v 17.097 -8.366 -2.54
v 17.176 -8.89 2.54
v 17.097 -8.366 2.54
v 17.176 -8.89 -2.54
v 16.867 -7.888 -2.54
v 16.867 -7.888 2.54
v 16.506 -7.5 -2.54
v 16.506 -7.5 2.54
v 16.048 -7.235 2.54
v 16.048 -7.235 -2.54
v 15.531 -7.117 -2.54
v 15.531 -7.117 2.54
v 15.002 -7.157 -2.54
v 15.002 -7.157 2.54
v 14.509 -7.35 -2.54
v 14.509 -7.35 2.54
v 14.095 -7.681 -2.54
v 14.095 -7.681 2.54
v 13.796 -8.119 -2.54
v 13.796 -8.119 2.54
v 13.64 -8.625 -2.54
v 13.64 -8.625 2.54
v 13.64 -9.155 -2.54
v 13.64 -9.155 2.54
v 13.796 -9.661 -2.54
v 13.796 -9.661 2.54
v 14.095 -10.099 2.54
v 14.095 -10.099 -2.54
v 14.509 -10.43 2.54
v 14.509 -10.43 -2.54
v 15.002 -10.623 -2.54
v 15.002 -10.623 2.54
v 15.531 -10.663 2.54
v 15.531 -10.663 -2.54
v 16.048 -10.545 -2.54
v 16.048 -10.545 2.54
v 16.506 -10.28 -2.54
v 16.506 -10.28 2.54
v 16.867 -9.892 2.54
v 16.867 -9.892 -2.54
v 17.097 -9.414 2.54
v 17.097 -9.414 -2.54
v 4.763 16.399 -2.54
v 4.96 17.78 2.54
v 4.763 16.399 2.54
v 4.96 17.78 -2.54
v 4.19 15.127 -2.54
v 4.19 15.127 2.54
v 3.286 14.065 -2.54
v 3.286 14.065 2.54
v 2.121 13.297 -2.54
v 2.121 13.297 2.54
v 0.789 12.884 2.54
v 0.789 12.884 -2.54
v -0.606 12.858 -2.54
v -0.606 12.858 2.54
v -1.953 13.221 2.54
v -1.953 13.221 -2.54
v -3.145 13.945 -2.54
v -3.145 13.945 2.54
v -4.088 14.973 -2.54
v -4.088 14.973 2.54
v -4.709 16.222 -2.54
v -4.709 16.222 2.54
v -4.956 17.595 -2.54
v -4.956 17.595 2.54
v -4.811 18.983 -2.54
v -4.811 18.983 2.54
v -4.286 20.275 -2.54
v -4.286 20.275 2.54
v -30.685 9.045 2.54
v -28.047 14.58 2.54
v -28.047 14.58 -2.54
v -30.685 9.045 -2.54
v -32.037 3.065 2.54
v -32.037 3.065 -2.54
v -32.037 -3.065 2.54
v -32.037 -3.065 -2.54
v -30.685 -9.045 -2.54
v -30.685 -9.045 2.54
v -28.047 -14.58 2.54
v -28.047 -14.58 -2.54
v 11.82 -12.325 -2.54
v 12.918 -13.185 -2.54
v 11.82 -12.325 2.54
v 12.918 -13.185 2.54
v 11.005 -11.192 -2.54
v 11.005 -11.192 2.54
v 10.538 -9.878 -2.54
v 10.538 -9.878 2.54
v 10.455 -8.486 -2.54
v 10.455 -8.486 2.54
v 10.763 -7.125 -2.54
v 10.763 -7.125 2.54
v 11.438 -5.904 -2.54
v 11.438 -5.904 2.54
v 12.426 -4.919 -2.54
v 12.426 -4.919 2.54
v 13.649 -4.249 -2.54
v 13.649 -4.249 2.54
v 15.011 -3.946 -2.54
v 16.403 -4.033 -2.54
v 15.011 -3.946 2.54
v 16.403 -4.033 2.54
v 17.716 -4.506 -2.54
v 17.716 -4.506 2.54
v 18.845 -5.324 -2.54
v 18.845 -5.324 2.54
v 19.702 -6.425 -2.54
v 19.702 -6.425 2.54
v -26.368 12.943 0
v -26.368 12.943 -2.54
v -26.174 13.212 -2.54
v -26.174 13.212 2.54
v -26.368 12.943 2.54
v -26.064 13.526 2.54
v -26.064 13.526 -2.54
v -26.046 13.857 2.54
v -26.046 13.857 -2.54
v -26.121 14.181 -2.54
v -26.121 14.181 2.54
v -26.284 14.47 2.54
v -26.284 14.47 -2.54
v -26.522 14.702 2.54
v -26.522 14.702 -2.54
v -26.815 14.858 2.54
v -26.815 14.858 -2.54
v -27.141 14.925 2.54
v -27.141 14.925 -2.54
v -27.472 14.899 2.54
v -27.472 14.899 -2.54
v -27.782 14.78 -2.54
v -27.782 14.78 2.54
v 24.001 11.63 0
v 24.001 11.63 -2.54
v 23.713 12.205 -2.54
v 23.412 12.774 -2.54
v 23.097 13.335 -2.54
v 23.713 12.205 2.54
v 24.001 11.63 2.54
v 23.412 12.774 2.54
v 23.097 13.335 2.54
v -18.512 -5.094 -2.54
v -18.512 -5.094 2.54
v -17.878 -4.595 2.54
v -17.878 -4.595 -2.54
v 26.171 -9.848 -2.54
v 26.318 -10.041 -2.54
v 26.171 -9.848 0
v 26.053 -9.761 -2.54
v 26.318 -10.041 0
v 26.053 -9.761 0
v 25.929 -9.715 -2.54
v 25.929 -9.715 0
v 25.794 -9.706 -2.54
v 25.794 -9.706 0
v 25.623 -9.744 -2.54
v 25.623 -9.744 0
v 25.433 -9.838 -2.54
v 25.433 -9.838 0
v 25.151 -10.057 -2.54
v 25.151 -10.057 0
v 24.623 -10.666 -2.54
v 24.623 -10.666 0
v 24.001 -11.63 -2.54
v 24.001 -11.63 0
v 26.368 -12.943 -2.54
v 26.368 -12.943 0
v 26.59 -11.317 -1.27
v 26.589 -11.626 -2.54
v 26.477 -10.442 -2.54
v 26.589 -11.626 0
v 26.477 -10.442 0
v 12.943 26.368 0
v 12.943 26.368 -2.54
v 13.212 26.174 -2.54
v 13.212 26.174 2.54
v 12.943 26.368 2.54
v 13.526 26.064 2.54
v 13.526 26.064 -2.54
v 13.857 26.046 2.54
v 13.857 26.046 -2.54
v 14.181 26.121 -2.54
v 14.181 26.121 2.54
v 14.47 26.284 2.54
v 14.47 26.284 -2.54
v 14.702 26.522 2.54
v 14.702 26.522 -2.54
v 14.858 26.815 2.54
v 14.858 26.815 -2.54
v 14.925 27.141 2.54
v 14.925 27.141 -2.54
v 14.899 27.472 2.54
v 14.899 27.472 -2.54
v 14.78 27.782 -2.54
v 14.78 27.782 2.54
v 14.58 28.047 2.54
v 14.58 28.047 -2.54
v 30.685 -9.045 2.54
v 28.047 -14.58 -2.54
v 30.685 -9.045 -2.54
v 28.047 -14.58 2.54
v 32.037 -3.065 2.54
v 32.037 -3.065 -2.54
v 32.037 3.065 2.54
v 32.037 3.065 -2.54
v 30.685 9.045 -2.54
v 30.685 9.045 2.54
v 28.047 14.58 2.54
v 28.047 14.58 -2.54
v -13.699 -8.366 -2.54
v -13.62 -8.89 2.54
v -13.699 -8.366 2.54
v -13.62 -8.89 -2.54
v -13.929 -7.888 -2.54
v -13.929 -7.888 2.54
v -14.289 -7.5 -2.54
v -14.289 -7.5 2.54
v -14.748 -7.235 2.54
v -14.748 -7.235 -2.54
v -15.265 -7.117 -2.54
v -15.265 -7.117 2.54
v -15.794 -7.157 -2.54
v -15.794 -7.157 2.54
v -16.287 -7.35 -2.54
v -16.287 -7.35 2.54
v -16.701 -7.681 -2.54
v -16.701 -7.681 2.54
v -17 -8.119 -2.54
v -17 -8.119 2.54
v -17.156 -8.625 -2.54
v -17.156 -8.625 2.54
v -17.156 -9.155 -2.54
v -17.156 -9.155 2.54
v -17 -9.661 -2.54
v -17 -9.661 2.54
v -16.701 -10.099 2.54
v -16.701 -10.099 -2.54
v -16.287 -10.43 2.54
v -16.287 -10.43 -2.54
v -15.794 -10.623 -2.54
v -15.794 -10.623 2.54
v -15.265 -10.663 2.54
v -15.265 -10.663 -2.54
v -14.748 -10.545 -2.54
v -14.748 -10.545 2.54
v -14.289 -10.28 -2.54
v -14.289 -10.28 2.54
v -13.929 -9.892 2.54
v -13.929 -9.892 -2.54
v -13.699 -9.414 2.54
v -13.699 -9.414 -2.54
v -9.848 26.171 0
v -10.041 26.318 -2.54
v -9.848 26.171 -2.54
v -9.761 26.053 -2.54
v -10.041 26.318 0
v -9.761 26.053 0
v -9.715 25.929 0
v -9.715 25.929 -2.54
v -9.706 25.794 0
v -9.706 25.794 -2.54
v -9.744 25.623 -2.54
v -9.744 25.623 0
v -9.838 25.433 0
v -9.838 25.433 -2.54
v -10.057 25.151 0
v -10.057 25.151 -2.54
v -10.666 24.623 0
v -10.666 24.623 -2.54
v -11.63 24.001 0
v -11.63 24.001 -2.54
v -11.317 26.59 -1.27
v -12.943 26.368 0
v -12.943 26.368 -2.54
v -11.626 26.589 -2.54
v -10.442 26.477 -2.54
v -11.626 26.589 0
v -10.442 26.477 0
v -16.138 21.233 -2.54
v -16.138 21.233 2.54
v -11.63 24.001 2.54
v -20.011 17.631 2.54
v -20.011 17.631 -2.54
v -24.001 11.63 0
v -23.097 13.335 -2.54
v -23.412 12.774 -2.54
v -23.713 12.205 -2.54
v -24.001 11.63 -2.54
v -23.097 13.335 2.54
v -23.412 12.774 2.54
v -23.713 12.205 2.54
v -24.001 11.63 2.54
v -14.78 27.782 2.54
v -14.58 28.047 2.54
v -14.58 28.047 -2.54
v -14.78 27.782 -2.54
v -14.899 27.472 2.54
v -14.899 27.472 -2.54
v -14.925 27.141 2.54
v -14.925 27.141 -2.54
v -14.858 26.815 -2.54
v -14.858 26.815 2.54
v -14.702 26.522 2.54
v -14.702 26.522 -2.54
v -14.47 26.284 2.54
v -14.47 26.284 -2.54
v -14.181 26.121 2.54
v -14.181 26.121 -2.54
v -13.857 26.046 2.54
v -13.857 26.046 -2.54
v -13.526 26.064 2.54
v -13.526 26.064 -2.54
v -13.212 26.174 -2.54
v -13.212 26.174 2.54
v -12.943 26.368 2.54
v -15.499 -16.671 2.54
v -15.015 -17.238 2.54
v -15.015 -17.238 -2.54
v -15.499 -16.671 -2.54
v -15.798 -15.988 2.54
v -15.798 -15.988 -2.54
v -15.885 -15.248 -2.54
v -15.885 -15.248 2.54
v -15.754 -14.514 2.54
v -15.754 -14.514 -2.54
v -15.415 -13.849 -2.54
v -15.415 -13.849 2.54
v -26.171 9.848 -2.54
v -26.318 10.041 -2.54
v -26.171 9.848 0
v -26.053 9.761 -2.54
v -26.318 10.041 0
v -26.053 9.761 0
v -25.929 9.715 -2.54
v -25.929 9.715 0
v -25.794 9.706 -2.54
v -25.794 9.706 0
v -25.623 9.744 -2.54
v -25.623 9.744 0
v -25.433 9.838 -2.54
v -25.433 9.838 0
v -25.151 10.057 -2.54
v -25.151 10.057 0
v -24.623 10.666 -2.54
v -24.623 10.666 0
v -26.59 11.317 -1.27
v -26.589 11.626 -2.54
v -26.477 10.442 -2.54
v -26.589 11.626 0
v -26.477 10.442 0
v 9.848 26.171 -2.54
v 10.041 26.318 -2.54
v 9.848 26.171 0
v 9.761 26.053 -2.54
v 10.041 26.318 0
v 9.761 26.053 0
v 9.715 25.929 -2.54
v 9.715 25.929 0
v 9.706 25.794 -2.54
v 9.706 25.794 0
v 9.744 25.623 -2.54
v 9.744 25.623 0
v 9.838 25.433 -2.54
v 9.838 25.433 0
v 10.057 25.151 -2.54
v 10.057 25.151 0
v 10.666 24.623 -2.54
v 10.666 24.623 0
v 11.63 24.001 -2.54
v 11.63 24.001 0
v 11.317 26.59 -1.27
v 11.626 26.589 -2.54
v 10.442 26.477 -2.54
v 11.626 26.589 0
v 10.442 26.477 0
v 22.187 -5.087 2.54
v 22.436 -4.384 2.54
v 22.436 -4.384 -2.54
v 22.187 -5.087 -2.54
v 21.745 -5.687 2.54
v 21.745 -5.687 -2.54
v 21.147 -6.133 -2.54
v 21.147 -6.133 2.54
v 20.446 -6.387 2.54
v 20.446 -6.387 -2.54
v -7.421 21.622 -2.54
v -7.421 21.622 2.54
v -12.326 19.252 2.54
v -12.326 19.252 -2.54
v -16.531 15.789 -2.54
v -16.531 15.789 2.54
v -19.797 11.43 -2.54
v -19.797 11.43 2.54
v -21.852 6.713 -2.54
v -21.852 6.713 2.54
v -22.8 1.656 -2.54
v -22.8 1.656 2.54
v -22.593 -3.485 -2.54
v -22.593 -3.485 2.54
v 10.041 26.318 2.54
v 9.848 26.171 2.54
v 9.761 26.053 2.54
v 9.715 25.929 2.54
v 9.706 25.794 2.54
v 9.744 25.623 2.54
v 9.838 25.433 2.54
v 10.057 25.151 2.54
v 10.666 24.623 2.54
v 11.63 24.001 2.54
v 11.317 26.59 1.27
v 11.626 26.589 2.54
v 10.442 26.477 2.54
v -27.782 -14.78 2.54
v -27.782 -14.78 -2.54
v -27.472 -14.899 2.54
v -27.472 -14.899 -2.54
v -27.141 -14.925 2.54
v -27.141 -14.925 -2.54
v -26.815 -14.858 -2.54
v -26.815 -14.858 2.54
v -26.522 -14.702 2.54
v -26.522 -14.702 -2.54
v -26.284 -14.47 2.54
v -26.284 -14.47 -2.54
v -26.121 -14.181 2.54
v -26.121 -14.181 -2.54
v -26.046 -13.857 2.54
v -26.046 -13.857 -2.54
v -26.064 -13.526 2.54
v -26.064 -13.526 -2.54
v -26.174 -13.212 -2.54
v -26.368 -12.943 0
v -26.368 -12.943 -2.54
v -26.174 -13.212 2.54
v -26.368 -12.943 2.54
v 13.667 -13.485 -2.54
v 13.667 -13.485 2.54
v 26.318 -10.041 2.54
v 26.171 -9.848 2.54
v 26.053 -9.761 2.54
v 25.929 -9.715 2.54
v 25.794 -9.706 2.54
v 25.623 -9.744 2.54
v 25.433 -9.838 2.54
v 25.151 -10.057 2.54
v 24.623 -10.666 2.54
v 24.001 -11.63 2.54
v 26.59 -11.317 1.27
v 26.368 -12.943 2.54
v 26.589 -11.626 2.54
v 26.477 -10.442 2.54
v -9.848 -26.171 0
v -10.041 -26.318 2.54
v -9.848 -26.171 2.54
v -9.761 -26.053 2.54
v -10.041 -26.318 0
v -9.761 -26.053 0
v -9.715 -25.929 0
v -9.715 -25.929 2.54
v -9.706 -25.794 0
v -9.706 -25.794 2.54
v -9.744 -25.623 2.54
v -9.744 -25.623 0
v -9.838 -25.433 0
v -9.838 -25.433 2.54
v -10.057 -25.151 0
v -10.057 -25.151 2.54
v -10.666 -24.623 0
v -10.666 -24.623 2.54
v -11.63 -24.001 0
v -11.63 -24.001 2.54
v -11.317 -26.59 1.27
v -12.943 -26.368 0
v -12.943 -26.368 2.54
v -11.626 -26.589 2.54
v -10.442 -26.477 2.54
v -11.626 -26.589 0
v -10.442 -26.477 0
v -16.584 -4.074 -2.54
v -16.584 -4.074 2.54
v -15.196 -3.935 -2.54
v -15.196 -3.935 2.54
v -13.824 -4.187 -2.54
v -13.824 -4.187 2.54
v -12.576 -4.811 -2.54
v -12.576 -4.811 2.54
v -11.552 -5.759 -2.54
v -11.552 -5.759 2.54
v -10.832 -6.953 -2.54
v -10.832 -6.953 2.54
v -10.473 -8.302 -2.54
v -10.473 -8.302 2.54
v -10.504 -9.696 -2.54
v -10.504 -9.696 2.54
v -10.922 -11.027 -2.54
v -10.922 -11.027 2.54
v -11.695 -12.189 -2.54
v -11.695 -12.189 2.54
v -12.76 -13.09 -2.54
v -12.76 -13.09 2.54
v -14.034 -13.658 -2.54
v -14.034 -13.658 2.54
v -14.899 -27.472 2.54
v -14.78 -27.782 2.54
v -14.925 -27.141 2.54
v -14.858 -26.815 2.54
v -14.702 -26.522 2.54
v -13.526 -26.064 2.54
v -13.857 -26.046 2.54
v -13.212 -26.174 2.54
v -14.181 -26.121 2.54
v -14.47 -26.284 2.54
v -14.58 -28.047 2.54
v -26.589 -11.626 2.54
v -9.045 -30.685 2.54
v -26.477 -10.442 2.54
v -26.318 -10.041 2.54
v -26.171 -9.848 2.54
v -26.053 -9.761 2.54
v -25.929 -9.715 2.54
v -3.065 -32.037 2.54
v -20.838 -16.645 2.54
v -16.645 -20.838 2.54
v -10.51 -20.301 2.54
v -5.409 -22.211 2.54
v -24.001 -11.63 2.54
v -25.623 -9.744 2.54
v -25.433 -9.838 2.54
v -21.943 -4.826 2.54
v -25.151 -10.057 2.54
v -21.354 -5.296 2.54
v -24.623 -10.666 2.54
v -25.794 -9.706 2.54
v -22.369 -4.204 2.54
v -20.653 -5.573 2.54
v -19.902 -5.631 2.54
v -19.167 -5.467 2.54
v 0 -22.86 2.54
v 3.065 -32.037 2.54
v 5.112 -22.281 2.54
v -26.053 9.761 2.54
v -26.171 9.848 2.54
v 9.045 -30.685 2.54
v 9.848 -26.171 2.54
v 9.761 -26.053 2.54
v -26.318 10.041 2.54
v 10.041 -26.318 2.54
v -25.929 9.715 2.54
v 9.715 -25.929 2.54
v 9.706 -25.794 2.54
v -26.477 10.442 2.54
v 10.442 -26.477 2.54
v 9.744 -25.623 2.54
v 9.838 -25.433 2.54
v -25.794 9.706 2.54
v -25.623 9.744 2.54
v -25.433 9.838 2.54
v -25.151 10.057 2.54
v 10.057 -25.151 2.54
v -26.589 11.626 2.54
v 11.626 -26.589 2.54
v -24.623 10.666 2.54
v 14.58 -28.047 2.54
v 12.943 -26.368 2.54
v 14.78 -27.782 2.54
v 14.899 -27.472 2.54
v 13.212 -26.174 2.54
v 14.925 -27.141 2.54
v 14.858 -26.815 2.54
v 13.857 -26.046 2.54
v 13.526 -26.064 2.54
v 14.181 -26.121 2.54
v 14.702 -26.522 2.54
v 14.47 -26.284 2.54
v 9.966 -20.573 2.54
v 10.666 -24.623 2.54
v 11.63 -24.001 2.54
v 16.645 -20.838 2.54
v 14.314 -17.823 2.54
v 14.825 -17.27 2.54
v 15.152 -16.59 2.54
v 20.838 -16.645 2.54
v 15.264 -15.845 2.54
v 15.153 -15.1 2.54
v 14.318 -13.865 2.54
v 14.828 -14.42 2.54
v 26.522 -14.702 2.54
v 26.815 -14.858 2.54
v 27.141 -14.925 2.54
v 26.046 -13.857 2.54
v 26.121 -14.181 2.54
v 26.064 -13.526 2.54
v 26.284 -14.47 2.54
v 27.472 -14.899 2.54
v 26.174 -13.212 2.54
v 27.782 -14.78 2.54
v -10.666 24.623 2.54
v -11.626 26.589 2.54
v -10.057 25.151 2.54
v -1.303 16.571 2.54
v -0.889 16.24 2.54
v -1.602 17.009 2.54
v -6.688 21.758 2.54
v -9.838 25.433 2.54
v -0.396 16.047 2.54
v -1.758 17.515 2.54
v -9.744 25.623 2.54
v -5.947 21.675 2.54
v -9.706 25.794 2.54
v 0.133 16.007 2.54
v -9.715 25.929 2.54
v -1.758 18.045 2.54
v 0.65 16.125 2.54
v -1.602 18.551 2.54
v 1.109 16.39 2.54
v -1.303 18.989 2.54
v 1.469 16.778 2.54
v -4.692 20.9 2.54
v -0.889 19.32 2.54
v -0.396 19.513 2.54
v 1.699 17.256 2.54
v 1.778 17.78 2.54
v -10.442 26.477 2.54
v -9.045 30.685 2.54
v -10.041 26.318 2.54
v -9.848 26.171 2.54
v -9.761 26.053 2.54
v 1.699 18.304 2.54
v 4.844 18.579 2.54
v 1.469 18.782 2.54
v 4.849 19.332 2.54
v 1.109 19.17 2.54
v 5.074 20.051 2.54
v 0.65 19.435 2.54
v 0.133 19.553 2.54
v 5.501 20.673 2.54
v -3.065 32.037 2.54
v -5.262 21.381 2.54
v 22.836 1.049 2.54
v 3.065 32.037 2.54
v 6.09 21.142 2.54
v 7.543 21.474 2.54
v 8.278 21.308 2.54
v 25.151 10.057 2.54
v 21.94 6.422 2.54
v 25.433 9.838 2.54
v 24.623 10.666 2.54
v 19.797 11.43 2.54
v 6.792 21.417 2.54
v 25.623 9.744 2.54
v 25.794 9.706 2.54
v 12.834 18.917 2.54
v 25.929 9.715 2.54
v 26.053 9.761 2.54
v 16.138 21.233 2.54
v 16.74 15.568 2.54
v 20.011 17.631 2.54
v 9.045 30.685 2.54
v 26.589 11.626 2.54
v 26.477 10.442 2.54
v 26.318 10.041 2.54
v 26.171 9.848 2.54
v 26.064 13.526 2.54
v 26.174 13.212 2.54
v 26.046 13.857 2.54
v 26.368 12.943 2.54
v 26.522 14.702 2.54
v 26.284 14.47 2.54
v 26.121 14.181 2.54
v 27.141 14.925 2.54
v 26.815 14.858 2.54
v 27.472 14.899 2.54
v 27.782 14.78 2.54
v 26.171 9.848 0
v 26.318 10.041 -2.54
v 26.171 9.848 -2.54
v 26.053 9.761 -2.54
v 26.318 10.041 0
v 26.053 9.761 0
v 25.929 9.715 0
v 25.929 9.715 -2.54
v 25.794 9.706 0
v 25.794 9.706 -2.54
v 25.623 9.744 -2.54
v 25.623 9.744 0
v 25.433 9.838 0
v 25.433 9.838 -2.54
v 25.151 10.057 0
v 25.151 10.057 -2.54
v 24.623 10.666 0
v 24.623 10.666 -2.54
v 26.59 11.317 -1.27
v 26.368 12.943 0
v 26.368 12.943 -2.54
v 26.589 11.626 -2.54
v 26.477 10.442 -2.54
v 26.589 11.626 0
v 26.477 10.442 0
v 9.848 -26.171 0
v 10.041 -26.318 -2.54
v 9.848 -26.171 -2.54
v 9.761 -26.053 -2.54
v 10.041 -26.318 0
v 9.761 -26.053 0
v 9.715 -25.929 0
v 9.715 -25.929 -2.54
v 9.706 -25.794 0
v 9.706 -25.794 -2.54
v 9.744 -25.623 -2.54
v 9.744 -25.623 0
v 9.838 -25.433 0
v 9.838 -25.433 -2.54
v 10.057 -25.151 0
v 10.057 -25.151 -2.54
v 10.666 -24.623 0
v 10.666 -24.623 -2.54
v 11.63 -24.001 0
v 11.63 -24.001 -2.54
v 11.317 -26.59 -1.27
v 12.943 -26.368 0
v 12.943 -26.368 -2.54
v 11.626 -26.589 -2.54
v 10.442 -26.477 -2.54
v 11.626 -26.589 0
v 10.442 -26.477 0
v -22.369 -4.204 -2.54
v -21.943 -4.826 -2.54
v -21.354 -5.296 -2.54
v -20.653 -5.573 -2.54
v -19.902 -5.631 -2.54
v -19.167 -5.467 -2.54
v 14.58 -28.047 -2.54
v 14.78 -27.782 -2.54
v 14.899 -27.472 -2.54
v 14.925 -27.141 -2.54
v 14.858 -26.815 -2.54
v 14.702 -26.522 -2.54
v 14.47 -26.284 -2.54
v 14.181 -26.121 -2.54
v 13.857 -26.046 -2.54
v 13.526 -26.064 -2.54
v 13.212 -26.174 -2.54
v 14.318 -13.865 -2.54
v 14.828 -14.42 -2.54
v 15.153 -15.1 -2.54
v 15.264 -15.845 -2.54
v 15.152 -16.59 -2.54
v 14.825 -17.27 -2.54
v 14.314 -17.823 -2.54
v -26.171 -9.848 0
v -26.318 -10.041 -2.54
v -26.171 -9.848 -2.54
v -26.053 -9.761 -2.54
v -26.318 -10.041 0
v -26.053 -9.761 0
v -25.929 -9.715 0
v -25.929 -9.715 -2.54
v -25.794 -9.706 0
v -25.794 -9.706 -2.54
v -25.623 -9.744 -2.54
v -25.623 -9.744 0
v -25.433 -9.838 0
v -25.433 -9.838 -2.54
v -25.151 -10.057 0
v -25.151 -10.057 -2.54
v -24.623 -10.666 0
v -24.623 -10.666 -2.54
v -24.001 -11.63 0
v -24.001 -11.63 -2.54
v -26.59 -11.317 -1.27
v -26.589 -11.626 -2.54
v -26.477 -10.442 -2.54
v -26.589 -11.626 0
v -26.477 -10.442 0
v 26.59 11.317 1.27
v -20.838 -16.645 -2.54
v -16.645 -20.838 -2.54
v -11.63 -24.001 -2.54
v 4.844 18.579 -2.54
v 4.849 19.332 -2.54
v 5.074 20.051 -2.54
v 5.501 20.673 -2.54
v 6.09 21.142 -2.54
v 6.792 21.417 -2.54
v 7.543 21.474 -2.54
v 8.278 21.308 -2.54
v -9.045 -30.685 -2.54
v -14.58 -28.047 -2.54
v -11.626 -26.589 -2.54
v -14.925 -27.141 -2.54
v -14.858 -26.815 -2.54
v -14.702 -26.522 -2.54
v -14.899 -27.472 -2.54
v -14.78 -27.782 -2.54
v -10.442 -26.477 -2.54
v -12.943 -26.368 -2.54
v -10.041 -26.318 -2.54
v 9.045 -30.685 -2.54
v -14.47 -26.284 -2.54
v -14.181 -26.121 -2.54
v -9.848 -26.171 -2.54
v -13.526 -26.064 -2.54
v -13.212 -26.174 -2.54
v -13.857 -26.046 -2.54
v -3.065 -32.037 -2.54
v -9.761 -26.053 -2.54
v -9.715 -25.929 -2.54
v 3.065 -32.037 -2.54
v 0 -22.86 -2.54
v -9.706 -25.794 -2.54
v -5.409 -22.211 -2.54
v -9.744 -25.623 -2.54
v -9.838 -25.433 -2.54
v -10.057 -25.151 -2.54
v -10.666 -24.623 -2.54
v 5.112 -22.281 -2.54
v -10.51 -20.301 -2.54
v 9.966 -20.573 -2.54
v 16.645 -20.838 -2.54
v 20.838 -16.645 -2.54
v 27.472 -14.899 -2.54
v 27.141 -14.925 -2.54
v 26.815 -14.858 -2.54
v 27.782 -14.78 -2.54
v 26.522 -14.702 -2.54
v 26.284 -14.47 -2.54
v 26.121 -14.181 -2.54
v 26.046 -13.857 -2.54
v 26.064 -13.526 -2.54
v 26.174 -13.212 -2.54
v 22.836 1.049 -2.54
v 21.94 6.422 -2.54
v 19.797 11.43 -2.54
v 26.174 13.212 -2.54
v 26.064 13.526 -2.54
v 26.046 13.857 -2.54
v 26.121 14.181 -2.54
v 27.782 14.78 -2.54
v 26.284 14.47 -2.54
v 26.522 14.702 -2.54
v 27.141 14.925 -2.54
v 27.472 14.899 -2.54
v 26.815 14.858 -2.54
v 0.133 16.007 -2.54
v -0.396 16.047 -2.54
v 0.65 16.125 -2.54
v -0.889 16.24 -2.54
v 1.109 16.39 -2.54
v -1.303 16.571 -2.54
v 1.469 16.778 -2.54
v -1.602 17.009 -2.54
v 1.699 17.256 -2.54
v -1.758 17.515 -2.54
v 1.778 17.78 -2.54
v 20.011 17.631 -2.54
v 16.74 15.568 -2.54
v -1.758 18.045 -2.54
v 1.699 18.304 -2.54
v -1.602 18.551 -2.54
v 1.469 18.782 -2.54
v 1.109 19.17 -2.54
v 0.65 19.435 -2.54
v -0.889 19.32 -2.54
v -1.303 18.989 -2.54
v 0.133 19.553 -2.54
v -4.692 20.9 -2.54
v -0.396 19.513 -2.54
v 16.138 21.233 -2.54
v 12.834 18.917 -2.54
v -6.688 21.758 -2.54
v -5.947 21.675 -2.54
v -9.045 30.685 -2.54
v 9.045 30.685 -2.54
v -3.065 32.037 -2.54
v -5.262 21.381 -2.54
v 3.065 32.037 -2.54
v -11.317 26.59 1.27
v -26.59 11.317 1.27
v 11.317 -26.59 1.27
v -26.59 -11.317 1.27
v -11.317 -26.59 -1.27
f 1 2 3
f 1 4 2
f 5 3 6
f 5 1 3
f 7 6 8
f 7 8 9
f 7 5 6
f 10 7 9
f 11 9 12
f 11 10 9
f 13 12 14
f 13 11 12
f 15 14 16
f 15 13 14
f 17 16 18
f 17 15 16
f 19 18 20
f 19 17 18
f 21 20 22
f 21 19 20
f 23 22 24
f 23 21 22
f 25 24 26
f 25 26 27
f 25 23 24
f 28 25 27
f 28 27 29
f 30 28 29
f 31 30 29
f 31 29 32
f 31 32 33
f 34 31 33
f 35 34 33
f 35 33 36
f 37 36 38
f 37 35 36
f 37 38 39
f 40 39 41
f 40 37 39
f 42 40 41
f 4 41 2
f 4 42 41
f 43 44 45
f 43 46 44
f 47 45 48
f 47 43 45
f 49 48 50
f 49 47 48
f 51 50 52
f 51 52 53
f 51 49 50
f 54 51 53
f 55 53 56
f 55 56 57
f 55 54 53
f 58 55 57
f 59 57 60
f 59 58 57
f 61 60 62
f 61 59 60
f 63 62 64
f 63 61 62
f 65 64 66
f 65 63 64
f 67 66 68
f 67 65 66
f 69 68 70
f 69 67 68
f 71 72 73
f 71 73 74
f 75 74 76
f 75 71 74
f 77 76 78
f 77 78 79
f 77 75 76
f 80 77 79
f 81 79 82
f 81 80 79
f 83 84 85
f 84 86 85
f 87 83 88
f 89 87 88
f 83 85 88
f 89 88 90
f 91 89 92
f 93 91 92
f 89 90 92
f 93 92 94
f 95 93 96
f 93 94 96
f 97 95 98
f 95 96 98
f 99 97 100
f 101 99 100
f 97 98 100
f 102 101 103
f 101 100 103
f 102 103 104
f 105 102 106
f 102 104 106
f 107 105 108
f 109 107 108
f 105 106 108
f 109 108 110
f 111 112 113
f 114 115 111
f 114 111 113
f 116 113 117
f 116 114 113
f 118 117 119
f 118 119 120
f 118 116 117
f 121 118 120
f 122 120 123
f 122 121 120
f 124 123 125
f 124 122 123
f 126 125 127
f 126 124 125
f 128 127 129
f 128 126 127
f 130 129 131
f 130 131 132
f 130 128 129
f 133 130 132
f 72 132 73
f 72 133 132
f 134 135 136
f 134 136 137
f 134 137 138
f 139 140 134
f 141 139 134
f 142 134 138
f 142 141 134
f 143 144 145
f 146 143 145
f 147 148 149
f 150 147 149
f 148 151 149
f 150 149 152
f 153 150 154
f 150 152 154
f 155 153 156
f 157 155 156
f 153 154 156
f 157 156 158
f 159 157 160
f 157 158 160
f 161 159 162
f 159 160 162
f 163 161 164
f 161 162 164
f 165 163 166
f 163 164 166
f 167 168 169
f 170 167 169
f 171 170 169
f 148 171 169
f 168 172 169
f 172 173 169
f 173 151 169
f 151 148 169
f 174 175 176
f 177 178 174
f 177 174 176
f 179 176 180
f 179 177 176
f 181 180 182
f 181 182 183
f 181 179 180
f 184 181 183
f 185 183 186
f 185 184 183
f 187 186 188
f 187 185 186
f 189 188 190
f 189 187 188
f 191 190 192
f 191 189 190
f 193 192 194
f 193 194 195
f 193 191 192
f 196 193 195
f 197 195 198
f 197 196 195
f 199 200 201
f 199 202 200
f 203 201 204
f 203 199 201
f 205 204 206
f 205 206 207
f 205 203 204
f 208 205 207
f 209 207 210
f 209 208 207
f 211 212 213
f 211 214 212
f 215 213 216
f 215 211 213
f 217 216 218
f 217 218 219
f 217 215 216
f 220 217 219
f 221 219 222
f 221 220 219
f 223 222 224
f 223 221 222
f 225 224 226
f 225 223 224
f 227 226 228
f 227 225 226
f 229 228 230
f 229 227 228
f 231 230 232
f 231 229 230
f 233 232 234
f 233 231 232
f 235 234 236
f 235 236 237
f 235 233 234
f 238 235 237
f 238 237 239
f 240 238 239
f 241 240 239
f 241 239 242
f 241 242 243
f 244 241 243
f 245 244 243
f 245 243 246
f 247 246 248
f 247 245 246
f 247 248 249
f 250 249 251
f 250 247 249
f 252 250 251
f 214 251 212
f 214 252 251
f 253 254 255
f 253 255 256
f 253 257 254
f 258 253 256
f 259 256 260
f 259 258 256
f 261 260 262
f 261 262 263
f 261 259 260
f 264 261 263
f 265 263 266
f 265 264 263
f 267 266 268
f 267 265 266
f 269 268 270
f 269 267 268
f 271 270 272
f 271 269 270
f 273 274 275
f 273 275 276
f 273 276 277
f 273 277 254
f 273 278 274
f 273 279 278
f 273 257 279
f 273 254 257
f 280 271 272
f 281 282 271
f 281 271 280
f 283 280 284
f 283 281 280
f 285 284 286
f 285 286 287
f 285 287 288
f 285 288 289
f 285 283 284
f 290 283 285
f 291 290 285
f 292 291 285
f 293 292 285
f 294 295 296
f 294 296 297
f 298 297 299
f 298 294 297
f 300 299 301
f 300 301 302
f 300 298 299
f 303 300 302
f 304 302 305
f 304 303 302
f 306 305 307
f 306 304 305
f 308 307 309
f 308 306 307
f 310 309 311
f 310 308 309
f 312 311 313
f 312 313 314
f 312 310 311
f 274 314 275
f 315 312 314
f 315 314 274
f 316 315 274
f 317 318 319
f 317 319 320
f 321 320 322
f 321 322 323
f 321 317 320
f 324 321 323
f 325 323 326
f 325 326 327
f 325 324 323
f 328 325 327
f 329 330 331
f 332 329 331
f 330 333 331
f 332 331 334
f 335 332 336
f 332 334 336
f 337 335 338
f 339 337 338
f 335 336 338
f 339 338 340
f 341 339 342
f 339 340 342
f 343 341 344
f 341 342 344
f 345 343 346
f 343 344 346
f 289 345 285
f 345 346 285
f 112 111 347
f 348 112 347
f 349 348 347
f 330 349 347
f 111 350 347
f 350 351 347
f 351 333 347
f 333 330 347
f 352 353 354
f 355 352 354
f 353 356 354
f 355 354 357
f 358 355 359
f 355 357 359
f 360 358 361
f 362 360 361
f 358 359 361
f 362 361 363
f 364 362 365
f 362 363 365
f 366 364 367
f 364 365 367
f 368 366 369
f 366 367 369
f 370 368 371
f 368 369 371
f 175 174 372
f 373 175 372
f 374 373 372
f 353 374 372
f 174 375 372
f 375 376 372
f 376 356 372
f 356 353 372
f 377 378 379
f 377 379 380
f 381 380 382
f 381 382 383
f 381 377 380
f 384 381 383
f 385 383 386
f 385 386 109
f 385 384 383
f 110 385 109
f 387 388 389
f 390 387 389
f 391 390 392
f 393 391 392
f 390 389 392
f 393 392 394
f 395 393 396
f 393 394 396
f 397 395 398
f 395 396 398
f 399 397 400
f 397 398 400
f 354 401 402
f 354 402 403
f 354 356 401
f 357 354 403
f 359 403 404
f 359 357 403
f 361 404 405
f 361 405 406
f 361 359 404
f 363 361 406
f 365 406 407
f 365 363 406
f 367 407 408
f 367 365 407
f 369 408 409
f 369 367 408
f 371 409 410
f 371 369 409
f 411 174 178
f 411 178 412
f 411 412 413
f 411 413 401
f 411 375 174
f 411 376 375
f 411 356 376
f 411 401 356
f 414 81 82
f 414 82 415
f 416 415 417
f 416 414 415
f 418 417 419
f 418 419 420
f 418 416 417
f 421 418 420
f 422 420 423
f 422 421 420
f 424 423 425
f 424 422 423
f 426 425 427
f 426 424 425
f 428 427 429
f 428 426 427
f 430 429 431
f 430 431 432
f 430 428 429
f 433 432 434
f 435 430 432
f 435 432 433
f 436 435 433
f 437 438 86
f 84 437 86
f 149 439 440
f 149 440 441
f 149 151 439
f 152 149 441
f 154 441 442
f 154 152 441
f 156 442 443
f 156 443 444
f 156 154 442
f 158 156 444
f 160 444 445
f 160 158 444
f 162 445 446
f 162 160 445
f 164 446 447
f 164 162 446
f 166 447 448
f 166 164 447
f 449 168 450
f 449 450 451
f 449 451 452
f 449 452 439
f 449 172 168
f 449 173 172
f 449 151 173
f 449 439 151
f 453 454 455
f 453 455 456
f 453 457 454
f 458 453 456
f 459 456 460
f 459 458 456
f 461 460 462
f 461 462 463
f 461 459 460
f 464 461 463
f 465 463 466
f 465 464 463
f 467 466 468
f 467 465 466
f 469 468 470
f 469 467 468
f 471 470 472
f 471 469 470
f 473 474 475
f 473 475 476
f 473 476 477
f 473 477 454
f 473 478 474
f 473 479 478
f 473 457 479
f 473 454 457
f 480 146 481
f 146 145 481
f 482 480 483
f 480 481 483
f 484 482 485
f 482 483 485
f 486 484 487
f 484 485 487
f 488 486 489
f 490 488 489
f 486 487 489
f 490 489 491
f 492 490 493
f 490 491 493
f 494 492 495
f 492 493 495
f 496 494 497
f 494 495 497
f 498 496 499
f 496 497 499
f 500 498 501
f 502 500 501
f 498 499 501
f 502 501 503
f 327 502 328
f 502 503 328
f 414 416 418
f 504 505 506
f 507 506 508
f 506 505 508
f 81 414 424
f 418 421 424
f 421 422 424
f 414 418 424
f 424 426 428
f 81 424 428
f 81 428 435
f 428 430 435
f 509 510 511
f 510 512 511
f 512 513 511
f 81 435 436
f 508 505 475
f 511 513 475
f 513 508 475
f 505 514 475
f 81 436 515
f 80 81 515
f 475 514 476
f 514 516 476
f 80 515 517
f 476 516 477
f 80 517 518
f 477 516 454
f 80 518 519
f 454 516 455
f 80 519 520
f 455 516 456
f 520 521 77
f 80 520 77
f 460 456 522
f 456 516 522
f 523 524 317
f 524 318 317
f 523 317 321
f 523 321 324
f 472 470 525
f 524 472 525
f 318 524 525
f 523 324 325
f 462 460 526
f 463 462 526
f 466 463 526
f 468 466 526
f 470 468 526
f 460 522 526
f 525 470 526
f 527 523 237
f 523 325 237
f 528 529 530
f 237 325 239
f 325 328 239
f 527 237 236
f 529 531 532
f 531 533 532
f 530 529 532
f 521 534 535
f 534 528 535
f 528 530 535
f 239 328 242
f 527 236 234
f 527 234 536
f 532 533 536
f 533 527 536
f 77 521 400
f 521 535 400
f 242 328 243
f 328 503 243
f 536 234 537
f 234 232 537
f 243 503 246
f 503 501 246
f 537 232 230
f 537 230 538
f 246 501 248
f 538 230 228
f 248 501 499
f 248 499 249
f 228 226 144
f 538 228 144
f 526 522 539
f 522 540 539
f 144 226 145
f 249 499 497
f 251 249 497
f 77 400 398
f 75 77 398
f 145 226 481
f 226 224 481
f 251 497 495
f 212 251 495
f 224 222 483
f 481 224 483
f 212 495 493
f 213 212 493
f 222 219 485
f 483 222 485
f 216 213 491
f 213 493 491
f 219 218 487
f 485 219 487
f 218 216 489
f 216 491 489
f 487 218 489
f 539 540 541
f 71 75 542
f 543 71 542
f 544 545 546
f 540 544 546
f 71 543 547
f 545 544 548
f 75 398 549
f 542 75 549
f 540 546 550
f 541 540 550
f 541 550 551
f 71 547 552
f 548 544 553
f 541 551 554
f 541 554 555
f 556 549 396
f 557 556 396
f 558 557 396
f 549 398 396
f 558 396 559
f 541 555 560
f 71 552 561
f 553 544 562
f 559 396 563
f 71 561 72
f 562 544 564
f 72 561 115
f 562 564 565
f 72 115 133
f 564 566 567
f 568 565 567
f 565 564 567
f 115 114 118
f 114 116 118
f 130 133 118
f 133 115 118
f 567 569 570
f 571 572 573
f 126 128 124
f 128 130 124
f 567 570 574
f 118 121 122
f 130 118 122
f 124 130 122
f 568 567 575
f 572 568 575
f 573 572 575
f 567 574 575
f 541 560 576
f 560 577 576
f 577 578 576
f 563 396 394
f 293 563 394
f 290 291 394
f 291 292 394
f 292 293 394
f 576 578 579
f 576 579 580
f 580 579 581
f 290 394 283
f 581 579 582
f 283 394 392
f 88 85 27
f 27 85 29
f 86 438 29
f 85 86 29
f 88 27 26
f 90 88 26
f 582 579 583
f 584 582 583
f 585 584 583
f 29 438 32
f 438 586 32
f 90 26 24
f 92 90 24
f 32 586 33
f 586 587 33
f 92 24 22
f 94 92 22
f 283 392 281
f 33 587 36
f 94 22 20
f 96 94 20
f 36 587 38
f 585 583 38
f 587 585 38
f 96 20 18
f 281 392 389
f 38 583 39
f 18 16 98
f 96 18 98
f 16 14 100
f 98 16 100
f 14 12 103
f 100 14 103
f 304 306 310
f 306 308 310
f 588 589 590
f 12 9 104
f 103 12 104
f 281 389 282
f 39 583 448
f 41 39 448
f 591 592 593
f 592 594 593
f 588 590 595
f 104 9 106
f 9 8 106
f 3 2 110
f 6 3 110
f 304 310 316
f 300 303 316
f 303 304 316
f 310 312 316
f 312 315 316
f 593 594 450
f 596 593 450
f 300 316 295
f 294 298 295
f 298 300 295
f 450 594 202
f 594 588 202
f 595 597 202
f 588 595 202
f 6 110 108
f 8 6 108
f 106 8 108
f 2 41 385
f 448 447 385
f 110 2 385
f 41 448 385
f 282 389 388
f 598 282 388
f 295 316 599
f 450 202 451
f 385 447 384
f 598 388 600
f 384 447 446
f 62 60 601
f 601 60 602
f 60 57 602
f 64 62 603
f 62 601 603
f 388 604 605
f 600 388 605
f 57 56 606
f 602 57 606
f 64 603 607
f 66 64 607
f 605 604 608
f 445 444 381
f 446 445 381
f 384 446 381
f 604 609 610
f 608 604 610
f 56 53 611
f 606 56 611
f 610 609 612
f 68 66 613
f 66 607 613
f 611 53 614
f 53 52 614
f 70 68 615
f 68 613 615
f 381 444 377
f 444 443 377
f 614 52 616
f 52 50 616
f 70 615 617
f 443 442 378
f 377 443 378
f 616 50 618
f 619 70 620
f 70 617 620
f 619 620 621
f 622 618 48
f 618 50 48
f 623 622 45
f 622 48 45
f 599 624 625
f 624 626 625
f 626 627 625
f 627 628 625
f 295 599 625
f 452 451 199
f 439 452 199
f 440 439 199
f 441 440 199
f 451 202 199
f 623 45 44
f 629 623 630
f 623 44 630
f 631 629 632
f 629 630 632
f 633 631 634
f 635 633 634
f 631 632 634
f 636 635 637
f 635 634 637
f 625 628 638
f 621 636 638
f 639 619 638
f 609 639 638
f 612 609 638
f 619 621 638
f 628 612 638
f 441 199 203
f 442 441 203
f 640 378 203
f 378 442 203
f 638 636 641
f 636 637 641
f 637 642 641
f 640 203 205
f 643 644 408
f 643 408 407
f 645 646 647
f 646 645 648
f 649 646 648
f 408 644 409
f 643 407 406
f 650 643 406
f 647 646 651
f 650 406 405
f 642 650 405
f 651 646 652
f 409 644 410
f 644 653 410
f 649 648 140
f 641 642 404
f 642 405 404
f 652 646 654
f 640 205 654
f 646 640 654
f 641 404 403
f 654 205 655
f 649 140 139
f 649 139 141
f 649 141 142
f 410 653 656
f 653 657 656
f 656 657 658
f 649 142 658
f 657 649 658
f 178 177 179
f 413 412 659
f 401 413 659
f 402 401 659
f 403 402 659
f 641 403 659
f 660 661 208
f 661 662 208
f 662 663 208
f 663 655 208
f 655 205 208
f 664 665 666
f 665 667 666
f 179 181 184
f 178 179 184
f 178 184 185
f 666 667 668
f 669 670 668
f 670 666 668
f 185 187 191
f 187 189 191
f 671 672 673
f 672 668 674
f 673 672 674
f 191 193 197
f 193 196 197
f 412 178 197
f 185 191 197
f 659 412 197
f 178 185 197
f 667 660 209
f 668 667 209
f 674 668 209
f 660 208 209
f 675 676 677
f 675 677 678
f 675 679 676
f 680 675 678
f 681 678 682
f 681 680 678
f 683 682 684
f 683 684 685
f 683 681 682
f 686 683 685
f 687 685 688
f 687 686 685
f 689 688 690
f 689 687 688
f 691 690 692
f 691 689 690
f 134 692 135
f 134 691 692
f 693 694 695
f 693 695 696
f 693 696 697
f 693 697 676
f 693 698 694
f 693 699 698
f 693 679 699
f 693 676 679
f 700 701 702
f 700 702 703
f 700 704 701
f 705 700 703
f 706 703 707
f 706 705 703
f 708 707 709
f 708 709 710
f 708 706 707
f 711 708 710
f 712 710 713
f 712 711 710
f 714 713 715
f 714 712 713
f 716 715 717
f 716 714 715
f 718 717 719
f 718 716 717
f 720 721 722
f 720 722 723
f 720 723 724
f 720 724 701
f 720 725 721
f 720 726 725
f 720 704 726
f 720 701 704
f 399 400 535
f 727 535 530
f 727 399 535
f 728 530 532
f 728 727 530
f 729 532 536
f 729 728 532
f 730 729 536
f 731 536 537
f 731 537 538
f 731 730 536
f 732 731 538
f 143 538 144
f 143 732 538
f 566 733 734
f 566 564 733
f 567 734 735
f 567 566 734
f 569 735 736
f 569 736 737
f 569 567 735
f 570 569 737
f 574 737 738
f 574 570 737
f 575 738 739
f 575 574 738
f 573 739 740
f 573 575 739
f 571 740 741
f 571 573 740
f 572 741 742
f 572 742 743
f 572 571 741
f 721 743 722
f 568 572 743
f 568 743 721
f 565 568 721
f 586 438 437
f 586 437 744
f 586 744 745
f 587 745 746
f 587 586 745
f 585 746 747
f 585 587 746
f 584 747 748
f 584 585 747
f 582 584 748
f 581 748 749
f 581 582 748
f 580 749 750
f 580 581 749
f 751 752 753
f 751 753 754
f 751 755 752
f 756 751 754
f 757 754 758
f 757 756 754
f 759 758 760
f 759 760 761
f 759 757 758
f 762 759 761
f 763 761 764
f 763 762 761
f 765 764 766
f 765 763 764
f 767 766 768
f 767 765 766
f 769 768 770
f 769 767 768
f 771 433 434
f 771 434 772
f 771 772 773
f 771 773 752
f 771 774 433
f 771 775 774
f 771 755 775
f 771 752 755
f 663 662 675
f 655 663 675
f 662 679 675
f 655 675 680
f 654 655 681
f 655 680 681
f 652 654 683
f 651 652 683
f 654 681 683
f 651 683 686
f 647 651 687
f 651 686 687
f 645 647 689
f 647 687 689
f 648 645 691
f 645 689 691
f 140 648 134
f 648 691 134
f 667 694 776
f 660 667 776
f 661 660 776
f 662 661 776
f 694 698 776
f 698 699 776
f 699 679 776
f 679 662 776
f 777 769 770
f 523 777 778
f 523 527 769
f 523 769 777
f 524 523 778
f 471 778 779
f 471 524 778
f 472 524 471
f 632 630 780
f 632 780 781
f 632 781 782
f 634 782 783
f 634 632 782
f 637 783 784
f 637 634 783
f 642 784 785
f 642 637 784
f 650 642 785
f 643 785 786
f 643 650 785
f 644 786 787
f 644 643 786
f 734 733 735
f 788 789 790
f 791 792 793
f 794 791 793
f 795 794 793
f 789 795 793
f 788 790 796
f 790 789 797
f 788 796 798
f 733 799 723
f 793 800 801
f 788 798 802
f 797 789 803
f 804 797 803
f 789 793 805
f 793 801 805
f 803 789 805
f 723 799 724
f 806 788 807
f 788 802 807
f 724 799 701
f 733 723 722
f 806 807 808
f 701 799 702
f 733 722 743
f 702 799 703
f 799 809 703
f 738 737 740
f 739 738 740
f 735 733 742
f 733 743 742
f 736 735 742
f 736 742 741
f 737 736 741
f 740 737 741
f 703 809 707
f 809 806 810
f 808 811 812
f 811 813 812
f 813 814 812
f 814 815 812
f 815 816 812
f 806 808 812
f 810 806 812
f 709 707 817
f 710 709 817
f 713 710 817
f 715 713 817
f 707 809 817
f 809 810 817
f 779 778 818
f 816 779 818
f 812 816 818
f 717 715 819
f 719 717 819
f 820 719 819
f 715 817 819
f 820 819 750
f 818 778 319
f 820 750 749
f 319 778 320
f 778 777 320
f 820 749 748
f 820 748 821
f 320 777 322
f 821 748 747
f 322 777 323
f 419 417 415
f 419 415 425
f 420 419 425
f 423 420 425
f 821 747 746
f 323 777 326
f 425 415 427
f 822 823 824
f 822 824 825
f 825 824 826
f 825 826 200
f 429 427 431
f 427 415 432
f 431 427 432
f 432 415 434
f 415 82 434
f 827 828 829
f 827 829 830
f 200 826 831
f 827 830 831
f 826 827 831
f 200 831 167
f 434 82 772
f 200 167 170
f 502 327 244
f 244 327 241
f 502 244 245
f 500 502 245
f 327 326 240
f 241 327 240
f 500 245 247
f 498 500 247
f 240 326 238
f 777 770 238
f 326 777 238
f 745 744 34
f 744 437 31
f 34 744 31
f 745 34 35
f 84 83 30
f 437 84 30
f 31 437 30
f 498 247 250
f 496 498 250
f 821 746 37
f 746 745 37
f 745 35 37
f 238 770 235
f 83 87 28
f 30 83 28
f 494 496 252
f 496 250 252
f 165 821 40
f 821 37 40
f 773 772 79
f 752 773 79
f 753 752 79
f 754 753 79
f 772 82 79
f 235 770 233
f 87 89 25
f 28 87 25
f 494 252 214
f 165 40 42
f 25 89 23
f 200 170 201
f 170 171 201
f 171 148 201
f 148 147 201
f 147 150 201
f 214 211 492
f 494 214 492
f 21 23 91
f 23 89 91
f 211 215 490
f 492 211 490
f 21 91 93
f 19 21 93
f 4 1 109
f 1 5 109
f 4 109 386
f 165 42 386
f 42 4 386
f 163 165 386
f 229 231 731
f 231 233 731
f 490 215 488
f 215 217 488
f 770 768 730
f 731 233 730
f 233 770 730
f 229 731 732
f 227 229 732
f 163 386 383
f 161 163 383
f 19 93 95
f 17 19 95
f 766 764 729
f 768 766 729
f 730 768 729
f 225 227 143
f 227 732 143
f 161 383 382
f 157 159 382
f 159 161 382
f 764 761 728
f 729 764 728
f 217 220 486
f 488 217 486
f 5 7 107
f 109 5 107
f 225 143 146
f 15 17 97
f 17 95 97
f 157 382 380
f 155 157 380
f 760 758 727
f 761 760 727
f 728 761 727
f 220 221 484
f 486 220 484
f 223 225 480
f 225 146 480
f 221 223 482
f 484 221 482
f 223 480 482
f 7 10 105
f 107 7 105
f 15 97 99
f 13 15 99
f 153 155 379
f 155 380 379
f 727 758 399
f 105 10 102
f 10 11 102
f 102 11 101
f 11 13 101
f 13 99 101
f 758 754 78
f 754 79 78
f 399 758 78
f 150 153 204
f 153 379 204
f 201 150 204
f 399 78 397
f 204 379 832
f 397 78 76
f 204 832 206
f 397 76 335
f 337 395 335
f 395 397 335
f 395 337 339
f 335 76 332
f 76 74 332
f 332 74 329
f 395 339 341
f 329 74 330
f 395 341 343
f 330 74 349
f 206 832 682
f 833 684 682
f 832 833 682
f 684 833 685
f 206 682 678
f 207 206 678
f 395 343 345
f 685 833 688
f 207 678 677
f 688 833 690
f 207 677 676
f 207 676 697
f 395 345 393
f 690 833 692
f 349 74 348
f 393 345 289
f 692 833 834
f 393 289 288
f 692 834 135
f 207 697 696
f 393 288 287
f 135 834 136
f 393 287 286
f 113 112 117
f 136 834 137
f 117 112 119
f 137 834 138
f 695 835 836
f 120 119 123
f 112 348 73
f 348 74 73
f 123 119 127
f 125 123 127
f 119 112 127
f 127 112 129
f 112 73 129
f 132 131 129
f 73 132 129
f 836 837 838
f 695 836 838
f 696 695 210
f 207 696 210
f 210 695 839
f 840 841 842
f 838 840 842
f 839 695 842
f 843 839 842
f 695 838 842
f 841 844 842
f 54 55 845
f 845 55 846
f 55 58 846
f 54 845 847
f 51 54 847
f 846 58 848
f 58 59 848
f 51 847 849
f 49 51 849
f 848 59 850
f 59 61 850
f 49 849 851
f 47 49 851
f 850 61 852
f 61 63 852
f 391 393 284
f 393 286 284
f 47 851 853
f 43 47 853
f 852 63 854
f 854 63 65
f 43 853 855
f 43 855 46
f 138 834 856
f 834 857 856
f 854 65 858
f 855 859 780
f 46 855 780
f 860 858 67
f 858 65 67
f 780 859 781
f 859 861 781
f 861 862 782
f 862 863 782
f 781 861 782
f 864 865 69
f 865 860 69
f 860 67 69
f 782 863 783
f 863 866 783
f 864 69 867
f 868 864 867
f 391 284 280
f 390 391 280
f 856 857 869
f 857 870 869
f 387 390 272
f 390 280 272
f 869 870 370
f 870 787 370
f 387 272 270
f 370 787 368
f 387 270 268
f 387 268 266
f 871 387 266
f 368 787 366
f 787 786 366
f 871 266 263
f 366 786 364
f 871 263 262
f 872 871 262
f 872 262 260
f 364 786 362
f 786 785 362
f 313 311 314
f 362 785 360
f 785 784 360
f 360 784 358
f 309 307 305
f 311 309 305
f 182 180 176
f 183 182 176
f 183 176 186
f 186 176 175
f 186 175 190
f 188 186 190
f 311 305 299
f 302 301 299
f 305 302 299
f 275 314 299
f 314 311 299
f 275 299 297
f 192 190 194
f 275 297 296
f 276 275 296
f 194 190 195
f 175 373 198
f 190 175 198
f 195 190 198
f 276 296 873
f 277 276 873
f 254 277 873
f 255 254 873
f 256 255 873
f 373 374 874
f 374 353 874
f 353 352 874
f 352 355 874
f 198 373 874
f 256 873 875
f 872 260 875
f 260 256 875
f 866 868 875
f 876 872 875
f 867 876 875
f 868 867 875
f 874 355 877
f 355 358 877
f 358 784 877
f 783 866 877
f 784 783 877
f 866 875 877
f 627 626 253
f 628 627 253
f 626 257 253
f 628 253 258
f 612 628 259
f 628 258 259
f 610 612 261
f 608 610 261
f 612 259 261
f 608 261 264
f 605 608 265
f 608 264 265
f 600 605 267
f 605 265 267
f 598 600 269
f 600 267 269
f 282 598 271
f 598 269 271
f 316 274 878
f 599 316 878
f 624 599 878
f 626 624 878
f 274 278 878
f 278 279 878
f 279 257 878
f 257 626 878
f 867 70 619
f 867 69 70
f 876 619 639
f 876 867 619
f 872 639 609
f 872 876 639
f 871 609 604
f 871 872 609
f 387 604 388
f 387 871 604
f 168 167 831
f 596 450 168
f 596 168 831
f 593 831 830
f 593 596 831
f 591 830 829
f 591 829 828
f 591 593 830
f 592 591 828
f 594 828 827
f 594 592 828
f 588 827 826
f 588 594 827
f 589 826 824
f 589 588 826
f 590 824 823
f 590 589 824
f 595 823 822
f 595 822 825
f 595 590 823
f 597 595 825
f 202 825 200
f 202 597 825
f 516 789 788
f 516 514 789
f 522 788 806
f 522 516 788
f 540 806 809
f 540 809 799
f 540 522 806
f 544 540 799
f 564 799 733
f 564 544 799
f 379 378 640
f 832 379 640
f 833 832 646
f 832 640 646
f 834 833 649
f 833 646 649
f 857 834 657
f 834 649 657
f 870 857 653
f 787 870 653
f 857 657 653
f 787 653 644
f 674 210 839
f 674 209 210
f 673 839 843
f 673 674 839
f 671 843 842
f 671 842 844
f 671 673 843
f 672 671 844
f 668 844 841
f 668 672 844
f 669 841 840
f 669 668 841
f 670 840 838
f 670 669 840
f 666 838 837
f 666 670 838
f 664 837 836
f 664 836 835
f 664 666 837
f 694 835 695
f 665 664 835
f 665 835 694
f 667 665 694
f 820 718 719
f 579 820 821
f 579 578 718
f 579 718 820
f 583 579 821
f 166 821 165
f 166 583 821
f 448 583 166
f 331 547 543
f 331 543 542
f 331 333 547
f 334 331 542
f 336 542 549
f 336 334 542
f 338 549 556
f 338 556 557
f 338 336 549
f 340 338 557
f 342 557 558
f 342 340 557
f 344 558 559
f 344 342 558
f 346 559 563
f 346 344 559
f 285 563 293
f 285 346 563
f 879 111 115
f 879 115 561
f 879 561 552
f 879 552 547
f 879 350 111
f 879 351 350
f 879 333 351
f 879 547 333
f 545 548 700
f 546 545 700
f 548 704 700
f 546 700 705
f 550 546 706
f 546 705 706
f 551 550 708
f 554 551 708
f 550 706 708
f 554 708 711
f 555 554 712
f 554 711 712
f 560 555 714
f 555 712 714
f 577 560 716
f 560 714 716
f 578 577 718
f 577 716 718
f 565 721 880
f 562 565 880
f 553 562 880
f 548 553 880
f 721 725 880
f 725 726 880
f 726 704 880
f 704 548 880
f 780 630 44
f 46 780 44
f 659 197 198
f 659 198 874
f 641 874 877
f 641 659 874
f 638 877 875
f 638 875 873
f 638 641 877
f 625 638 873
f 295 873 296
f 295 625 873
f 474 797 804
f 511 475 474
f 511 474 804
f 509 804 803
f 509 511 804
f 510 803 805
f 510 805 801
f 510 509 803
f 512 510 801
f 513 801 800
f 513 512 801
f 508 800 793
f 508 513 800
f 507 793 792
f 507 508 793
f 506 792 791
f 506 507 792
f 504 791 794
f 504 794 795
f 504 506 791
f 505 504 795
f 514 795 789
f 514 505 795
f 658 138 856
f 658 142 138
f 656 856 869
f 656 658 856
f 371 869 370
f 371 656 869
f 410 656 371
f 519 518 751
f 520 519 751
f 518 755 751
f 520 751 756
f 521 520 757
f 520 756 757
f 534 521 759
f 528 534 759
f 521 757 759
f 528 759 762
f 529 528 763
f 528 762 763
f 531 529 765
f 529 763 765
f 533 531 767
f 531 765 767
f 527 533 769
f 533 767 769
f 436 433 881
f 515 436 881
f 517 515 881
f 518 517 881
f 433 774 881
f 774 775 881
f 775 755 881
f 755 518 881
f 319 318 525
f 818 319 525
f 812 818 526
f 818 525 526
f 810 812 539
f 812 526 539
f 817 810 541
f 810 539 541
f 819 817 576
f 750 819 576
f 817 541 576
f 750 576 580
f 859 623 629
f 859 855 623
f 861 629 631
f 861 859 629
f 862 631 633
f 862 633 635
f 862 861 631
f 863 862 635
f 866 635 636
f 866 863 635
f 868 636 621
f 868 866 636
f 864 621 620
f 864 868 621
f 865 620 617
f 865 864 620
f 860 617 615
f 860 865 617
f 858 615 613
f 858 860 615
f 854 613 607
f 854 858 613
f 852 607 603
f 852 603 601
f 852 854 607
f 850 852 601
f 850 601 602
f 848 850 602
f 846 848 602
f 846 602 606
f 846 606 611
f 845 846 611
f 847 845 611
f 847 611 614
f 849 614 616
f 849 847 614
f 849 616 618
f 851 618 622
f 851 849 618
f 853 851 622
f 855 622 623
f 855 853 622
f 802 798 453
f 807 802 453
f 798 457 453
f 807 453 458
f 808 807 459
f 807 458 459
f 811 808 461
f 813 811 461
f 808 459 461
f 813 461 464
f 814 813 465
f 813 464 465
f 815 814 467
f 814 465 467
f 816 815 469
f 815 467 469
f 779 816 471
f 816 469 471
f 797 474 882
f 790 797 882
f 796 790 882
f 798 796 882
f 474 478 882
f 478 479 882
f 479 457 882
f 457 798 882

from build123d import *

# Parameters (mm, degrees)
SKETCH1_R           = 1.778
BOSS_EXTRUDE1_DEPTH = 2.54
FILLET1_R           = 2.54


with BuildPart() as part:
    # Sketch1 → Boss-Extrude1 (new, symmetric)
    with BuildSketch(Plane.XY):
        with BuildLine():
            ThreePointArc((23.096897519, 13.335), (18.163878776, 19.528502447), (11.629866574, 24.000731311))
            add(Edge.make_bspline(
                [(12.942718979, 26.367649013), (12.489890773, 26.524403161), (10.214611, 26.823602727), (8.514999239, 25.805149786), (11.629866574, 24.000731311)],
                knots=[0.119187678, 0.119187678, 0.119187678, 0.119187678, 0.354139338, 1, 1, 1, 1], degree=3))
            ThreePointArc((12.942718979, 26.367649013), (14.594299506, 26.395047723), (14.579783558, 28.046791715))
            ThreePointArc((14.579783558, 28.046791715), (0, 32.207688222), (-14.579783558, 28.046791715))
            ThreePointArc((-14.579783558, 28.046791715), (-14.594299506, 26.395047723), (-12.942718979, 26.367649013))
            add(Edge.make_bspline(
                [(-12.942718979, 26.367649013), (-12.489890773, 26.524403161), (-10.214611, 26.823602727), (-8.514999239, 25.805149786), (-11.629866574, 24.000731311)],
                knots=[0.119187678, 0.119187678, 0.119187678, 0.119187678, 0.354139338, 1, 1, 1, 1], degree=3))
            ThreePointArc((-11.629866574, 24.000731311), (-18.163878776, 19.528502447), (-23.096897519, 13.335))
            ThreePointArc((-23.096897519, 13.335), (-23.564242622, 12.49061126), (-24.000731311, 11.629866574))
            add(Edge.make_bspline(
                [(-26.367649013, 12.942718979), (-26.524403161, 12.489890773), (-26.823602727, 10.214611), (-25.805149786, 8.514999239), (-24.000731311, 11.629866574)],
                knots=[0.119187678, 0.119187678, 0.119187678, 0.119187678, 0.354139338, 1, 1, 1, 1], degree=3))
            ThreePointArc((-26.367649013, 12.942718979), (-26.395047723, 14.594299506), (-28.046791715, 14.579783558))
            ThreePointArc((-28.046791715, 14.579783558), (-32.207688222, 0), (-28.046791715, -14.579783558))
            ThreePointArc((-28.046791715, -14.579783558), (-26.395047723, -14.594299506), (-26.367649013, -12.942718979))
            add(Edge.make_bspline(
                [(-26.367649013, -12.942718979), (-26.524403161, -12.489890773), (-26.823602727, -10.214611), (-25.805149786, -8.514999239), (-24.000731311, -11.629866574)],
                knots=[0.119187678, 0.119187678, 0.119187678, 0.119187678, 0.354139338, 1, 1, 1, 1], degree=3))
            ThreePointArc((-24.000731311, -11.629866574), (-18.858537854, -18.858537854), (-11.629866574, -24.000731311))
            add(Edge.make_bspline(
                [(-12.942718979, -26.367649013), (-12.489890773, -26.524403161), (-10.214611, -26.823602727), (-8.514999239, -25.805149786), (-11.629866574, -24.000731311)],
                knots=[0.119187678, 0.119187678, 0.119187678, 0.119187678, 0.354139338, 1, 1, 1, 1], degree=3))
            ThreePointArc((-12.942718979, -26.367649013), (-14.594299506, -26.395047723), (-14.579783558, -28.046791715))
            ThreePointArc((-14.579783558, -28.046791715), (0, -32.207688222), (14.579783558, -28.046791715))
            ThreePointArc((14.579783558, -28.046791715), (14.594299506, -26.395047723), (12.942718979, -26.367649013))
            add(Edge.make_bspline(
                [(12.942718979, -26.367649013), (12.489890773, -26.524403161), (10.214611, -26.823602727), (8.514999239, -25.805149786), (11.629866574, -24.000731311)],
                knots=[0.119187678, 0.119187678, 0.119187678, 0.119187678, 0.354139338, 1, 1, 1, 1], degree=3))
            ThreePointArc((11.629866574, -24.000731311), (18.858537854, -18.858537854), (24.000731311, -11.629866574))
            add(Edge.make_bspline(
                [(26.367649013, -12.942718979), (26.524403161, -12.489890773), (26.823602727, -10.214611), (25.805149786, -8.514999239), (24.000731311, -11.629866574)],
                knots=[0.119187678, 0.119187678, 0.119187678, 0.119187678, 0.354139338, 1, 1, 1, 1], degree=3))
            ThreePointArc((26.367649013, -12.942718979), (26.395047723, -14.594299506), (28.046791715, -14.579783558))
            ThreePointArc((28.046791715, -14.579783558), (32.207688222, 0), (28.046791715, 14.579783558))
            ThreePointArc((28.046791715, 14.579783558), (26.395047723, 14.594299506), (26.367649013, 12.942718979))
            add(Edge.make_bspline(
                [(26.367649013, 12.942718979), (26.524403161, 12.489890773), (26.823602727, 10.214611), (25.805149786, 8.514999239), (24.000731311, 11.629866574)],
                knots=[0.119187678, 0.119187678, 0.119187678, 0.119187678, 0.354139338, 1, 1, 1, 1], degree=3))
            ThreePointArc((24.000731311, 11.629866574), (23.564242622, 12.49061126), (23.096897519, 13.335))
        make_face()
        with Locations((0, 17.78)):
            Circle(SKETCH1_R, mode=Mode.SUBTRACT)
        with Locations((15.397931679, -8.89)):
            Circle(SKETCH1_R, mode=Mode.SUBTRACT)
        with Locations((-15.397931679, -8.89)):
            Circle(SKETCH1_R, mode=Mode.SUBTRACT)
        with BuildLine():
            Line((-4.28625, 20.274952091), (-4.28625, 22.454568821))
            ThreePointArc((-4.28625, 22.454568821), (-13.24349331, 18.633021359), (-19.797340731, 11.43))
            ThreePointArc((-19.797340731, 11.43), (-22.758416501, 2.152690962), (-21.58935203, -7.515283024))
            Line((-21.58935203, -7.515283024), (-17.877685951, -4.59493961))
            ThreePointArc((-17.877685951, -4.59493961), (-10.605148477, -7.614870918), (-15.415498572, -13.849477433))
            Line((-15.415498572, -13.849477433), (-17.30310203, -14.939285797))
            ThreePointArc((-17.30310203, -14.939285797), (-9.514923191, -20.78571232), (0, -22.86))
            ThreePointArc((0, -22.86), (9.514923191, -20.78571232), (17.30310203, -14.939285797))
            Line((17.30310203, -14.939285797), (12.918177407, -13.18506039))
            ThreePointArc((12.918177407, -13.18506039), (11.8972459, -5.376892533), (19.701748572, -6.425474659))
            Line((19.701748572, -6.425474659), (21.58935203, -7.515283024))
            ThreePointArc((21.58935203, -7.515283024), (22.758416501, 2.152690962), (19.797340731, 11.43))
            ThreePointArc((19.797340731, 11.43), (13.24349331, 18.633021359), (4.28625, 22.454568821))
            Line((4.28625, 22.454568821), (4.959508544, 17.78))
            ThreePointArc((4.959508544, 17.78), (-1.292097423, 12.991763451), (-4.28625, 20.274952091))
        make_face(mode=Mode.SUBTRACT)
    extrude(amount=BOSS_EXTRUDE1_DEPTH, both=True)

    # Fillet1
    # the kernel refuses this fillet: 2.54 mm, written as the material it adds along each edge
    with BuildSketch(Plane(origin=(21.58935203, -7.515283024, 0), x_dir=(-0.8660254037844372, 0.5000000000000026, 0), z_dir=(0, 0, -1)), Plane(origin=(-17.30310203, -14.939285797, 0), x_dir=(0.8660254037844382, 0.5000000000000008, 0), z_dir=(0, 0, -1)), Plane(origin=(-4.28625, 22.454568821, 0), x_dir=(0, -1, 0), z_dir=(0, 0, -1))) as fillet1_piece_1:
        with BuildLine():
            CenterArc((3.235105636, 2.310312353), FILLET1_R, 161.0565991, 84.38964425)
            Line((0.832672738, 3.134882647), (0.78462408, 3.151374053))
            ThreePointArc((0.78462408, 3.151374053), (0.311567983, 1.595269408), (-0.049899042, 0.009525))
            Line((-0.049899042, 0.009525), (0, -0.0508))
            ThreePointArc((0, -0.0508), (1.089808365, -0.0508), (2.158506952, -0.046206247))
            Line((2.158506952, -0.046206247), (2.17961673, 0))
        make_face()
    extrude(amount=2.54)
    with BuildSketch(Plane(origin=(17.30310203, -14.939285797, 0), x_dir=(-0.7195709341275718, -0.6944189447003685, 0), z_dir=(0, 0, -1)), Plane(origin=(4.28625, 22.454568821, 0), x_dir=(0.9611699140434871, -0.2759572364291899, 0), z_dir=(0, 0, -1)), Plane(origin=(-21.58935203, -7.515283024, 0), x_dir=(-0.24159897991591575, 0.9703761811295601, 0), z_dir=(0, 0, -1))) as fillet1_piece_2:
        with BuildLine():
            CenterArc((3.922629513, 2.529497521), FILLET1_R, 155.785220789, 119.426923656)
            Line((1.60611307, 3.571299597), (1.559782741, 3.592135639))
            Line((1.559782741, 3.592135639), (-0.046330329, 0.020836042))
            Line((-0.046330329, 0.020836042), (-0.004614858, -0.05058995))
            ThreePointArc((-0.004614858, -0.05058995), (2.076686213, -0.145322312), (4.157987284, -0.05058995))
            Line((4.157987284, -0.05058995), (4.153372426, 0))
        make_face()
    extrude(amount=2.54)
    with BuildSketch(Plane(origin=(-21.58935203, -7.515283024, 0), x_dir=(-0.24159897991591575, 0.9703761811295601, 0), z_dir=(0, 0, 1)), Plane(origin=(4.28625, 22.454568821, 0), x_dir=(0.9611699140434871, -0.2759572364291899, 0), z_dir=(0, 0, 1)), Plane(origin=(17.30310203, -14.939285797, 0), x_dir=(-0.7195709341275718, -0.6944189447003685, 0), z_dir=(0, 0, 1))) as fillet1_piece_3:
        with BuildLine():
            CenterArc((3.922629513, -2.529497521), FILLET1_R, 84.787855555, 119.426923656)
            Line((1.60611307, -3.571299597), (1.559782741, -3.592135639))
            Line((1.559782741, -3.592135639), (-0.046330329, -0.020836042))
            Line((-0.046330329, -0.020836042), (-0.004614858, 0.05058995))
            ThreePointArc((-0.004614858, 0.05058995), (2.076686213, 0.145322312), (4.157987284, 0.05058995))
            Line((4.157987284, 0.05058995), (4.153372426, 0))
        make_face()
    extrude(amount=2.54)
    with BuildSketch(Plane(origin=(-4.28625, 22.454568821, 0), x_dir=(0, -1, 0), z_dir=(0, 0, 1)), Plane(origin=(-17.30310203, -14.939285797, 0), x_dir=(0.8660254037844382, 0.5000000000000008, 0), z_dir=(0, 0, 1)), Plane(origin=(21.58935203, -7.515283024, 0), x_dir=(-0.8660254037844372, 0.5000000000000026, 0), z_dir=(0, 0, 1))) as fillet1_piece_4:
        with BuildLine():
            CenterArc((3.235105636, -2.310312353), FILLET1_R, 114.55375665, 84.38964425)
            Line((0.832672738, -3.134882647), (0.78462408, -3.151374053))
            ThreePointArc((0.78462408, -3.151374053), (0.311567983, -1.595269408), (-0.049899042, -0.009525))
            Line((-0.049899042, -0.009525), (0, 0.0508))
            ThreePointArc((0, 0.0508), (1.089808365, 0.0508), (2.158506952, 0.046206247))
            Line((2.158506952, 0.046206247), (2.17961673, 0))
        make_face()
    extrude(amount=2.54)


solid = part.part
